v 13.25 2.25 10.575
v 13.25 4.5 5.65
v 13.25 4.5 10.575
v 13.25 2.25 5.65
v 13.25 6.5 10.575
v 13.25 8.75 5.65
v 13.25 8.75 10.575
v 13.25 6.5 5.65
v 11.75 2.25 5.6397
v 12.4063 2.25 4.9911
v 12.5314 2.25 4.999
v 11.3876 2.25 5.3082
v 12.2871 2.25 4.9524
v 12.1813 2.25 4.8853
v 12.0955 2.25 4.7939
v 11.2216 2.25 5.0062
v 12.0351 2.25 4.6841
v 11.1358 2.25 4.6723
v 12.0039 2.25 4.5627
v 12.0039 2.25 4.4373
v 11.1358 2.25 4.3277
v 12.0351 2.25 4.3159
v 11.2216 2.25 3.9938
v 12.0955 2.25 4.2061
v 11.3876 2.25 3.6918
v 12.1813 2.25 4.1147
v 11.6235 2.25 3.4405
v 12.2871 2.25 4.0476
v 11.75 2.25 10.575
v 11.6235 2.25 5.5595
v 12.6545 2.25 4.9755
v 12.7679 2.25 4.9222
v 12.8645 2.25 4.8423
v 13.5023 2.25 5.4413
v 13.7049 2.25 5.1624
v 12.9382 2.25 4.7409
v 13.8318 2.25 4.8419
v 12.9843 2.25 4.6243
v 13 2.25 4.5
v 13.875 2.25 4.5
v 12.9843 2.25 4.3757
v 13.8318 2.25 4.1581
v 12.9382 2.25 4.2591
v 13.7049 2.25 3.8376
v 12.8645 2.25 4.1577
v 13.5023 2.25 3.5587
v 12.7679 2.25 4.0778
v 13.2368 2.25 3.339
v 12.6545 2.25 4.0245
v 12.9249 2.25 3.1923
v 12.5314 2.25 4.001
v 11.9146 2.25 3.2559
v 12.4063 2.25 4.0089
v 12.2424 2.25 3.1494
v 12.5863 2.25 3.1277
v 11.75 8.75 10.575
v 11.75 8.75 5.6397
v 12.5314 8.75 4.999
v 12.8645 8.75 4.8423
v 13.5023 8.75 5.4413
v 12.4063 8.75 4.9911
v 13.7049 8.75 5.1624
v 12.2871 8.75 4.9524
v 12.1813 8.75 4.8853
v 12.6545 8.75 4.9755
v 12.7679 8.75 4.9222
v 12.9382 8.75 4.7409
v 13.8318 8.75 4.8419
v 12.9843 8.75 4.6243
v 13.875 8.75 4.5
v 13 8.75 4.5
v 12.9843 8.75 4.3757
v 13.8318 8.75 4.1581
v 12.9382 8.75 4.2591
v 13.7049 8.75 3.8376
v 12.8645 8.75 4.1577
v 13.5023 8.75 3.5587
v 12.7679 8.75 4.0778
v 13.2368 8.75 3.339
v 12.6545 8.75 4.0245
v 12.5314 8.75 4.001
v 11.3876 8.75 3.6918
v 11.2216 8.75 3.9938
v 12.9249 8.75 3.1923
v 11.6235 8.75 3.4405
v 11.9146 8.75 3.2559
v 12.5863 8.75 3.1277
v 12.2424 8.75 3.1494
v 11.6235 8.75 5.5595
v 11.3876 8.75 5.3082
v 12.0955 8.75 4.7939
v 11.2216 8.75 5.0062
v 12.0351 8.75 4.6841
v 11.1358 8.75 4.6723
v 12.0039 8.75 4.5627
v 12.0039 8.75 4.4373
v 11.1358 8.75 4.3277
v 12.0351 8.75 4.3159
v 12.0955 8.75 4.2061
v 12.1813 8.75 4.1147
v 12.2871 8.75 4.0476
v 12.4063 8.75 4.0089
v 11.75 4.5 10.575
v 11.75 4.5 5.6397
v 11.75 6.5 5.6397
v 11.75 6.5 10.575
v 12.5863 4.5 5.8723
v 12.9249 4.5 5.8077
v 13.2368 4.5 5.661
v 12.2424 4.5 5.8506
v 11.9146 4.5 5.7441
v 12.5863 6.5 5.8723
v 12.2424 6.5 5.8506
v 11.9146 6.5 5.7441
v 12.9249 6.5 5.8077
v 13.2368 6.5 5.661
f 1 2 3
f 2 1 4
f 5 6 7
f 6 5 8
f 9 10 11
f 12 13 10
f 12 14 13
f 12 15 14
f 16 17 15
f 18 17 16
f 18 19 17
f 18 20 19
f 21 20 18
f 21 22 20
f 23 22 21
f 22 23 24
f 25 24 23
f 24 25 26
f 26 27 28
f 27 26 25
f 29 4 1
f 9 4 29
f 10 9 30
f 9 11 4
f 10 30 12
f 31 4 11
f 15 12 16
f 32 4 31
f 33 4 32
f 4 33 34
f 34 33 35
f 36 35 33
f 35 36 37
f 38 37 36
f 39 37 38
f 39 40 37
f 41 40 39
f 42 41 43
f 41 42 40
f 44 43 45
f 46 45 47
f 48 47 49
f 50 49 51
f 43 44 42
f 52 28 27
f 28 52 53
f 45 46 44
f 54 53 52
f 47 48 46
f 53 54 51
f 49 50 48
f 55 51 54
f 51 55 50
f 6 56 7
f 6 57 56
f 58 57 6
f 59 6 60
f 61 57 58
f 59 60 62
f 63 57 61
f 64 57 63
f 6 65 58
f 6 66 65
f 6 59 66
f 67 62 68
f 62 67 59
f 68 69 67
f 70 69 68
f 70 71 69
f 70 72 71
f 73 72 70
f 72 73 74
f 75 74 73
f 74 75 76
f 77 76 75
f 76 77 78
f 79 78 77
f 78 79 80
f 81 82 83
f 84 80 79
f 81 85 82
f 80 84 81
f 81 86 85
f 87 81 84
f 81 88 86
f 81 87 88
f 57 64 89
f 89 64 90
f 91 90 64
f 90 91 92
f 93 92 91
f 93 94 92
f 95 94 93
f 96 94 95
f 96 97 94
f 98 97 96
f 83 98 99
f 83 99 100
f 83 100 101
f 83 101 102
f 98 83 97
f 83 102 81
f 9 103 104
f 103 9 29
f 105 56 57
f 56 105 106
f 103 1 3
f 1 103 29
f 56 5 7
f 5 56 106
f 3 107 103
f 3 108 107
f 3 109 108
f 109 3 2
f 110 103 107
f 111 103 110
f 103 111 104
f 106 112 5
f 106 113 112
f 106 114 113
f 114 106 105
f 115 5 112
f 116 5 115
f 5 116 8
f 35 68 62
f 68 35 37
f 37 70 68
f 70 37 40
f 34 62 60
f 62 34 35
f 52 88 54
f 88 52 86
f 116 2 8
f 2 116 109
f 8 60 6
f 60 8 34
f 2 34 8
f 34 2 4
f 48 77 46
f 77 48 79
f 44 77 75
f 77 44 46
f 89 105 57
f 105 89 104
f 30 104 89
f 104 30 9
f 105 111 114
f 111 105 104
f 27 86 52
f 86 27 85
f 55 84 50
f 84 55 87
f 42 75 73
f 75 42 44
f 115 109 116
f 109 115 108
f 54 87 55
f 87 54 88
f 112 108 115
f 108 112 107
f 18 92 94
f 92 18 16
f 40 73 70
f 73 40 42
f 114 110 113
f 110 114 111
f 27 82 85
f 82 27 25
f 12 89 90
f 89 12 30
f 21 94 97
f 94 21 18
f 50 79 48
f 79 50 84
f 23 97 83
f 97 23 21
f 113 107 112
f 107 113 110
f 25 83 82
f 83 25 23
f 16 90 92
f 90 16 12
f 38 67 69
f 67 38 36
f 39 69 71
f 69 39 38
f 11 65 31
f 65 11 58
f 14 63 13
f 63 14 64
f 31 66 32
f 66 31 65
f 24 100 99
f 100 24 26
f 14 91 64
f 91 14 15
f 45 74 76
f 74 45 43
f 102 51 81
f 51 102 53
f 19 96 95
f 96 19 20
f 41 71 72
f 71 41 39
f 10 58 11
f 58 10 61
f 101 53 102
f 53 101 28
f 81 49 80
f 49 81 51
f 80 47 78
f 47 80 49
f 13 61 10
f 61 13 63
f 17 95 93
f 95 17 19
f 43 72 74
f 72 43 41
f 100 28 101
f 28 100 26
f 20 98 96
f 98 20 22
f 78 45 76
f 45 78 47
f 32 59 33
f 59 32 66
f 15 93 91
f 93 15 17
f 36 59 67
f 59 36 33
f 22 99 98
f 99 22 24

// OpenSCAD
sensor_width = 7;
sensor_tower_width = 4.5;
sensor_length = 25;
sensor_height = 11;
sensor_gap = 3;
sensor_bottom = 3.5;
sensor_hole_diameter = 3;
sensor_hole_distance = 2.4;

pcb_width = 10.5;
pcb_length = 33;
pcb_height = 1.8;
pcb_sensor_x = 0.25;
pcb_conn_x = 0.7;
conn_length = 5.8;
conn_height = 7;

filament_width = 2;
wall_size = 2;
filament_top_distance = 3;
sensor_y_gap = 0.2;

flag_wall = 0.75;
flag_width = 6.5;
flag_gap = 2;
flag_height = 5;

part = "flag"; // "gantry" or "flag"

$fn = 25;

module sensor() {
    difference() {
        cube([sensor_length, sensor_width, sensor_bottom]);
        
        translate([sensor_hole_distance, sensor_width / 2, -1])
            cylinder(d = sensor_hole_diameter, h = sensor_bottom + 2);
        
        translate([sensor_length - sensor_hole_distance, sensor_width / 2, -1])
            cylinder(d = sensor_hole_diameter, h = sensor_bottom + 2);
    }
    
    translate([(sensor_length - sensor_gap - (2 * sensor_tower_width)) / 2, 0, sensor_bottom])
        cube([sensor_tower_width, sensor_width, sensor_height - sensor_bottom]);
    
    translate([(sensor_length - sensor_gap - (2 * sensor_tower_width)) / 2 + sensor_gap + sensor_tower_width, 0, sensor_bottom])
        cube([sensor_tower_width, sensor_width, sensor_height - sensor_bottom]);
}

module pcb() {
    difference() {
        cube([pcb_length, pcb_width, pcb_height]);
        
        translate([pcb_length - sensor_length - pcb_sensor_x, (pcb_width - sensor_width) / 2, 0])
            translate([sensor_hole_distance, sensor_width / 2, -1])
            cylinder(d = sensor_hole_diameter, h = pcb_height + 2);
        
        translate([pcb_length - sensor_length - pcb_sensor_x, (pcb_width - sensor_width) / 2, 0])
            translate([sensor_length - sensor_hole_distance, sensor_width / 2, -1])
            cylinder(d = sensor_hole_diameter, h = pcb_height + 2);
    }
    
    translate([pcb_length - sensor_length - pcb_sensor_x, (pcb_width - sensor_width) / 2, pcb_height])
        sensor();
    
    translate([pcb_conn_x, 0, -conn_height])
        cube([conn_length, pcb_width, conn_height]);
}

module gantry() {
    difference() {
        cube([sensor_hole_diameter + wall_size, sensor_width + (2 * wall_size), wall_size]);
        
        translate([sensor_hole_distance, wall_size + (sensor_width / 2), -1])
            cylinder(d = sensor_hole_diameter, h = wall_size + 2);
    }
    
    difference() {
        translate([sensor_length - sensor_hole_diameter - wall_size, 0, 0])
            cube([sensor_hole_diameter + wall_size, sensor_width + (2 * wall_size), wall_size]);
        
        translate([sensor_length - sensor_hole_distance, wall_size + (sensor_width / 2), -1])
            cylinder(d = sensor_hole_diameter, h = wall_size + 2);
    }
    
    translate([sensor_hole_diameter + wall_size, 0, 0])
        cube([sensor_length - (2 * (sensor_hole_diameter + wall_size)), wall_size - sensor_y_gap, wall_size]);
    
    translate([sensor_hole_diameter + wall_size, sensor_width + wall_size + sensor_y_gap, 0])
        cube([sensor_length - (2 * (sensor_hole_diameter + wall_size)), wall_size - sensor_y_gap, wall_size]);
    
    difference() {
        translate([sensor_length - (2 * (sensor_tower_width + sensor_gap)), 0, wall_size])
            cube([sensor_gap + wall_size, wall_size - sensor_y_gap, sensor_height - sensor_bottom - wall_size]);
        
        translate([sensor_length / 2, wall_size + 1, sensor_height - sensor_bottom - filament_top_distance])
            rotate([90, 0, 0])
            cylinder(d = filament_width, h = wall_size + 2);
    }
    
    difference() {
        translate([sensor_length - (2 * (sensor_tower_width + sensor_gap)), sensor_width + wall_size + sensor_y_gap, wall_size])
            cube([sensor_gap + wall_size, wall_size - sensor_y_gap, sensor_height - sensor_bottom - wall_size]);
        
        translate([sensor_length / 2, sensor_width + (2 * wall_size) + 1, sensor_height - sensor_bottom - filament_top_distance])
            rotate([90, 0, 0])
            cylinder(d = filament_width, h = wall_size + 2);
    }
}

module flag() {
    translate([sensor_length / 2, flag_width + wall_size + (sensor_width - flag_width) / 2, sensor_height - sensor_bottom - filament_top_distance])
    rotate([90, 0, 0])
    union() {
        difference() {
            translate([-sensor_gap / 4, (filament_width + flag_wall) / 2 - 0.3, 0])
                cube([sensor_gap / 2, flag_height, flag_width]);
            
            translate([-sensor_gap / 4 - 1, (filament_width + flag_wall) / 2 - 0.3, (flag_width - flag_gap) / 2])
                cube([sensor_gap / 2 + 2, flag_height + 1, flag_gap]);
        }
        difference() {
            cylinder(d = filament_width + flag_wall, h = flag_width);
            translate([0, 0, -1])
                cylinder(d = filament_width / 2, h = flag_width + 2);
        }
    }
}

%translate([-(pcb_length - sensor_length - pcb_sensor_x), (-(pcb_width - sensor_width) / 2) + wall_size, -pcb_height - sensor_bottom])
    pcb();

if (part == "gantry") {
    gantry();
} else {
    %gantry();
}

if (part == "flag") {
    flag();
} else {
    flag();
}
